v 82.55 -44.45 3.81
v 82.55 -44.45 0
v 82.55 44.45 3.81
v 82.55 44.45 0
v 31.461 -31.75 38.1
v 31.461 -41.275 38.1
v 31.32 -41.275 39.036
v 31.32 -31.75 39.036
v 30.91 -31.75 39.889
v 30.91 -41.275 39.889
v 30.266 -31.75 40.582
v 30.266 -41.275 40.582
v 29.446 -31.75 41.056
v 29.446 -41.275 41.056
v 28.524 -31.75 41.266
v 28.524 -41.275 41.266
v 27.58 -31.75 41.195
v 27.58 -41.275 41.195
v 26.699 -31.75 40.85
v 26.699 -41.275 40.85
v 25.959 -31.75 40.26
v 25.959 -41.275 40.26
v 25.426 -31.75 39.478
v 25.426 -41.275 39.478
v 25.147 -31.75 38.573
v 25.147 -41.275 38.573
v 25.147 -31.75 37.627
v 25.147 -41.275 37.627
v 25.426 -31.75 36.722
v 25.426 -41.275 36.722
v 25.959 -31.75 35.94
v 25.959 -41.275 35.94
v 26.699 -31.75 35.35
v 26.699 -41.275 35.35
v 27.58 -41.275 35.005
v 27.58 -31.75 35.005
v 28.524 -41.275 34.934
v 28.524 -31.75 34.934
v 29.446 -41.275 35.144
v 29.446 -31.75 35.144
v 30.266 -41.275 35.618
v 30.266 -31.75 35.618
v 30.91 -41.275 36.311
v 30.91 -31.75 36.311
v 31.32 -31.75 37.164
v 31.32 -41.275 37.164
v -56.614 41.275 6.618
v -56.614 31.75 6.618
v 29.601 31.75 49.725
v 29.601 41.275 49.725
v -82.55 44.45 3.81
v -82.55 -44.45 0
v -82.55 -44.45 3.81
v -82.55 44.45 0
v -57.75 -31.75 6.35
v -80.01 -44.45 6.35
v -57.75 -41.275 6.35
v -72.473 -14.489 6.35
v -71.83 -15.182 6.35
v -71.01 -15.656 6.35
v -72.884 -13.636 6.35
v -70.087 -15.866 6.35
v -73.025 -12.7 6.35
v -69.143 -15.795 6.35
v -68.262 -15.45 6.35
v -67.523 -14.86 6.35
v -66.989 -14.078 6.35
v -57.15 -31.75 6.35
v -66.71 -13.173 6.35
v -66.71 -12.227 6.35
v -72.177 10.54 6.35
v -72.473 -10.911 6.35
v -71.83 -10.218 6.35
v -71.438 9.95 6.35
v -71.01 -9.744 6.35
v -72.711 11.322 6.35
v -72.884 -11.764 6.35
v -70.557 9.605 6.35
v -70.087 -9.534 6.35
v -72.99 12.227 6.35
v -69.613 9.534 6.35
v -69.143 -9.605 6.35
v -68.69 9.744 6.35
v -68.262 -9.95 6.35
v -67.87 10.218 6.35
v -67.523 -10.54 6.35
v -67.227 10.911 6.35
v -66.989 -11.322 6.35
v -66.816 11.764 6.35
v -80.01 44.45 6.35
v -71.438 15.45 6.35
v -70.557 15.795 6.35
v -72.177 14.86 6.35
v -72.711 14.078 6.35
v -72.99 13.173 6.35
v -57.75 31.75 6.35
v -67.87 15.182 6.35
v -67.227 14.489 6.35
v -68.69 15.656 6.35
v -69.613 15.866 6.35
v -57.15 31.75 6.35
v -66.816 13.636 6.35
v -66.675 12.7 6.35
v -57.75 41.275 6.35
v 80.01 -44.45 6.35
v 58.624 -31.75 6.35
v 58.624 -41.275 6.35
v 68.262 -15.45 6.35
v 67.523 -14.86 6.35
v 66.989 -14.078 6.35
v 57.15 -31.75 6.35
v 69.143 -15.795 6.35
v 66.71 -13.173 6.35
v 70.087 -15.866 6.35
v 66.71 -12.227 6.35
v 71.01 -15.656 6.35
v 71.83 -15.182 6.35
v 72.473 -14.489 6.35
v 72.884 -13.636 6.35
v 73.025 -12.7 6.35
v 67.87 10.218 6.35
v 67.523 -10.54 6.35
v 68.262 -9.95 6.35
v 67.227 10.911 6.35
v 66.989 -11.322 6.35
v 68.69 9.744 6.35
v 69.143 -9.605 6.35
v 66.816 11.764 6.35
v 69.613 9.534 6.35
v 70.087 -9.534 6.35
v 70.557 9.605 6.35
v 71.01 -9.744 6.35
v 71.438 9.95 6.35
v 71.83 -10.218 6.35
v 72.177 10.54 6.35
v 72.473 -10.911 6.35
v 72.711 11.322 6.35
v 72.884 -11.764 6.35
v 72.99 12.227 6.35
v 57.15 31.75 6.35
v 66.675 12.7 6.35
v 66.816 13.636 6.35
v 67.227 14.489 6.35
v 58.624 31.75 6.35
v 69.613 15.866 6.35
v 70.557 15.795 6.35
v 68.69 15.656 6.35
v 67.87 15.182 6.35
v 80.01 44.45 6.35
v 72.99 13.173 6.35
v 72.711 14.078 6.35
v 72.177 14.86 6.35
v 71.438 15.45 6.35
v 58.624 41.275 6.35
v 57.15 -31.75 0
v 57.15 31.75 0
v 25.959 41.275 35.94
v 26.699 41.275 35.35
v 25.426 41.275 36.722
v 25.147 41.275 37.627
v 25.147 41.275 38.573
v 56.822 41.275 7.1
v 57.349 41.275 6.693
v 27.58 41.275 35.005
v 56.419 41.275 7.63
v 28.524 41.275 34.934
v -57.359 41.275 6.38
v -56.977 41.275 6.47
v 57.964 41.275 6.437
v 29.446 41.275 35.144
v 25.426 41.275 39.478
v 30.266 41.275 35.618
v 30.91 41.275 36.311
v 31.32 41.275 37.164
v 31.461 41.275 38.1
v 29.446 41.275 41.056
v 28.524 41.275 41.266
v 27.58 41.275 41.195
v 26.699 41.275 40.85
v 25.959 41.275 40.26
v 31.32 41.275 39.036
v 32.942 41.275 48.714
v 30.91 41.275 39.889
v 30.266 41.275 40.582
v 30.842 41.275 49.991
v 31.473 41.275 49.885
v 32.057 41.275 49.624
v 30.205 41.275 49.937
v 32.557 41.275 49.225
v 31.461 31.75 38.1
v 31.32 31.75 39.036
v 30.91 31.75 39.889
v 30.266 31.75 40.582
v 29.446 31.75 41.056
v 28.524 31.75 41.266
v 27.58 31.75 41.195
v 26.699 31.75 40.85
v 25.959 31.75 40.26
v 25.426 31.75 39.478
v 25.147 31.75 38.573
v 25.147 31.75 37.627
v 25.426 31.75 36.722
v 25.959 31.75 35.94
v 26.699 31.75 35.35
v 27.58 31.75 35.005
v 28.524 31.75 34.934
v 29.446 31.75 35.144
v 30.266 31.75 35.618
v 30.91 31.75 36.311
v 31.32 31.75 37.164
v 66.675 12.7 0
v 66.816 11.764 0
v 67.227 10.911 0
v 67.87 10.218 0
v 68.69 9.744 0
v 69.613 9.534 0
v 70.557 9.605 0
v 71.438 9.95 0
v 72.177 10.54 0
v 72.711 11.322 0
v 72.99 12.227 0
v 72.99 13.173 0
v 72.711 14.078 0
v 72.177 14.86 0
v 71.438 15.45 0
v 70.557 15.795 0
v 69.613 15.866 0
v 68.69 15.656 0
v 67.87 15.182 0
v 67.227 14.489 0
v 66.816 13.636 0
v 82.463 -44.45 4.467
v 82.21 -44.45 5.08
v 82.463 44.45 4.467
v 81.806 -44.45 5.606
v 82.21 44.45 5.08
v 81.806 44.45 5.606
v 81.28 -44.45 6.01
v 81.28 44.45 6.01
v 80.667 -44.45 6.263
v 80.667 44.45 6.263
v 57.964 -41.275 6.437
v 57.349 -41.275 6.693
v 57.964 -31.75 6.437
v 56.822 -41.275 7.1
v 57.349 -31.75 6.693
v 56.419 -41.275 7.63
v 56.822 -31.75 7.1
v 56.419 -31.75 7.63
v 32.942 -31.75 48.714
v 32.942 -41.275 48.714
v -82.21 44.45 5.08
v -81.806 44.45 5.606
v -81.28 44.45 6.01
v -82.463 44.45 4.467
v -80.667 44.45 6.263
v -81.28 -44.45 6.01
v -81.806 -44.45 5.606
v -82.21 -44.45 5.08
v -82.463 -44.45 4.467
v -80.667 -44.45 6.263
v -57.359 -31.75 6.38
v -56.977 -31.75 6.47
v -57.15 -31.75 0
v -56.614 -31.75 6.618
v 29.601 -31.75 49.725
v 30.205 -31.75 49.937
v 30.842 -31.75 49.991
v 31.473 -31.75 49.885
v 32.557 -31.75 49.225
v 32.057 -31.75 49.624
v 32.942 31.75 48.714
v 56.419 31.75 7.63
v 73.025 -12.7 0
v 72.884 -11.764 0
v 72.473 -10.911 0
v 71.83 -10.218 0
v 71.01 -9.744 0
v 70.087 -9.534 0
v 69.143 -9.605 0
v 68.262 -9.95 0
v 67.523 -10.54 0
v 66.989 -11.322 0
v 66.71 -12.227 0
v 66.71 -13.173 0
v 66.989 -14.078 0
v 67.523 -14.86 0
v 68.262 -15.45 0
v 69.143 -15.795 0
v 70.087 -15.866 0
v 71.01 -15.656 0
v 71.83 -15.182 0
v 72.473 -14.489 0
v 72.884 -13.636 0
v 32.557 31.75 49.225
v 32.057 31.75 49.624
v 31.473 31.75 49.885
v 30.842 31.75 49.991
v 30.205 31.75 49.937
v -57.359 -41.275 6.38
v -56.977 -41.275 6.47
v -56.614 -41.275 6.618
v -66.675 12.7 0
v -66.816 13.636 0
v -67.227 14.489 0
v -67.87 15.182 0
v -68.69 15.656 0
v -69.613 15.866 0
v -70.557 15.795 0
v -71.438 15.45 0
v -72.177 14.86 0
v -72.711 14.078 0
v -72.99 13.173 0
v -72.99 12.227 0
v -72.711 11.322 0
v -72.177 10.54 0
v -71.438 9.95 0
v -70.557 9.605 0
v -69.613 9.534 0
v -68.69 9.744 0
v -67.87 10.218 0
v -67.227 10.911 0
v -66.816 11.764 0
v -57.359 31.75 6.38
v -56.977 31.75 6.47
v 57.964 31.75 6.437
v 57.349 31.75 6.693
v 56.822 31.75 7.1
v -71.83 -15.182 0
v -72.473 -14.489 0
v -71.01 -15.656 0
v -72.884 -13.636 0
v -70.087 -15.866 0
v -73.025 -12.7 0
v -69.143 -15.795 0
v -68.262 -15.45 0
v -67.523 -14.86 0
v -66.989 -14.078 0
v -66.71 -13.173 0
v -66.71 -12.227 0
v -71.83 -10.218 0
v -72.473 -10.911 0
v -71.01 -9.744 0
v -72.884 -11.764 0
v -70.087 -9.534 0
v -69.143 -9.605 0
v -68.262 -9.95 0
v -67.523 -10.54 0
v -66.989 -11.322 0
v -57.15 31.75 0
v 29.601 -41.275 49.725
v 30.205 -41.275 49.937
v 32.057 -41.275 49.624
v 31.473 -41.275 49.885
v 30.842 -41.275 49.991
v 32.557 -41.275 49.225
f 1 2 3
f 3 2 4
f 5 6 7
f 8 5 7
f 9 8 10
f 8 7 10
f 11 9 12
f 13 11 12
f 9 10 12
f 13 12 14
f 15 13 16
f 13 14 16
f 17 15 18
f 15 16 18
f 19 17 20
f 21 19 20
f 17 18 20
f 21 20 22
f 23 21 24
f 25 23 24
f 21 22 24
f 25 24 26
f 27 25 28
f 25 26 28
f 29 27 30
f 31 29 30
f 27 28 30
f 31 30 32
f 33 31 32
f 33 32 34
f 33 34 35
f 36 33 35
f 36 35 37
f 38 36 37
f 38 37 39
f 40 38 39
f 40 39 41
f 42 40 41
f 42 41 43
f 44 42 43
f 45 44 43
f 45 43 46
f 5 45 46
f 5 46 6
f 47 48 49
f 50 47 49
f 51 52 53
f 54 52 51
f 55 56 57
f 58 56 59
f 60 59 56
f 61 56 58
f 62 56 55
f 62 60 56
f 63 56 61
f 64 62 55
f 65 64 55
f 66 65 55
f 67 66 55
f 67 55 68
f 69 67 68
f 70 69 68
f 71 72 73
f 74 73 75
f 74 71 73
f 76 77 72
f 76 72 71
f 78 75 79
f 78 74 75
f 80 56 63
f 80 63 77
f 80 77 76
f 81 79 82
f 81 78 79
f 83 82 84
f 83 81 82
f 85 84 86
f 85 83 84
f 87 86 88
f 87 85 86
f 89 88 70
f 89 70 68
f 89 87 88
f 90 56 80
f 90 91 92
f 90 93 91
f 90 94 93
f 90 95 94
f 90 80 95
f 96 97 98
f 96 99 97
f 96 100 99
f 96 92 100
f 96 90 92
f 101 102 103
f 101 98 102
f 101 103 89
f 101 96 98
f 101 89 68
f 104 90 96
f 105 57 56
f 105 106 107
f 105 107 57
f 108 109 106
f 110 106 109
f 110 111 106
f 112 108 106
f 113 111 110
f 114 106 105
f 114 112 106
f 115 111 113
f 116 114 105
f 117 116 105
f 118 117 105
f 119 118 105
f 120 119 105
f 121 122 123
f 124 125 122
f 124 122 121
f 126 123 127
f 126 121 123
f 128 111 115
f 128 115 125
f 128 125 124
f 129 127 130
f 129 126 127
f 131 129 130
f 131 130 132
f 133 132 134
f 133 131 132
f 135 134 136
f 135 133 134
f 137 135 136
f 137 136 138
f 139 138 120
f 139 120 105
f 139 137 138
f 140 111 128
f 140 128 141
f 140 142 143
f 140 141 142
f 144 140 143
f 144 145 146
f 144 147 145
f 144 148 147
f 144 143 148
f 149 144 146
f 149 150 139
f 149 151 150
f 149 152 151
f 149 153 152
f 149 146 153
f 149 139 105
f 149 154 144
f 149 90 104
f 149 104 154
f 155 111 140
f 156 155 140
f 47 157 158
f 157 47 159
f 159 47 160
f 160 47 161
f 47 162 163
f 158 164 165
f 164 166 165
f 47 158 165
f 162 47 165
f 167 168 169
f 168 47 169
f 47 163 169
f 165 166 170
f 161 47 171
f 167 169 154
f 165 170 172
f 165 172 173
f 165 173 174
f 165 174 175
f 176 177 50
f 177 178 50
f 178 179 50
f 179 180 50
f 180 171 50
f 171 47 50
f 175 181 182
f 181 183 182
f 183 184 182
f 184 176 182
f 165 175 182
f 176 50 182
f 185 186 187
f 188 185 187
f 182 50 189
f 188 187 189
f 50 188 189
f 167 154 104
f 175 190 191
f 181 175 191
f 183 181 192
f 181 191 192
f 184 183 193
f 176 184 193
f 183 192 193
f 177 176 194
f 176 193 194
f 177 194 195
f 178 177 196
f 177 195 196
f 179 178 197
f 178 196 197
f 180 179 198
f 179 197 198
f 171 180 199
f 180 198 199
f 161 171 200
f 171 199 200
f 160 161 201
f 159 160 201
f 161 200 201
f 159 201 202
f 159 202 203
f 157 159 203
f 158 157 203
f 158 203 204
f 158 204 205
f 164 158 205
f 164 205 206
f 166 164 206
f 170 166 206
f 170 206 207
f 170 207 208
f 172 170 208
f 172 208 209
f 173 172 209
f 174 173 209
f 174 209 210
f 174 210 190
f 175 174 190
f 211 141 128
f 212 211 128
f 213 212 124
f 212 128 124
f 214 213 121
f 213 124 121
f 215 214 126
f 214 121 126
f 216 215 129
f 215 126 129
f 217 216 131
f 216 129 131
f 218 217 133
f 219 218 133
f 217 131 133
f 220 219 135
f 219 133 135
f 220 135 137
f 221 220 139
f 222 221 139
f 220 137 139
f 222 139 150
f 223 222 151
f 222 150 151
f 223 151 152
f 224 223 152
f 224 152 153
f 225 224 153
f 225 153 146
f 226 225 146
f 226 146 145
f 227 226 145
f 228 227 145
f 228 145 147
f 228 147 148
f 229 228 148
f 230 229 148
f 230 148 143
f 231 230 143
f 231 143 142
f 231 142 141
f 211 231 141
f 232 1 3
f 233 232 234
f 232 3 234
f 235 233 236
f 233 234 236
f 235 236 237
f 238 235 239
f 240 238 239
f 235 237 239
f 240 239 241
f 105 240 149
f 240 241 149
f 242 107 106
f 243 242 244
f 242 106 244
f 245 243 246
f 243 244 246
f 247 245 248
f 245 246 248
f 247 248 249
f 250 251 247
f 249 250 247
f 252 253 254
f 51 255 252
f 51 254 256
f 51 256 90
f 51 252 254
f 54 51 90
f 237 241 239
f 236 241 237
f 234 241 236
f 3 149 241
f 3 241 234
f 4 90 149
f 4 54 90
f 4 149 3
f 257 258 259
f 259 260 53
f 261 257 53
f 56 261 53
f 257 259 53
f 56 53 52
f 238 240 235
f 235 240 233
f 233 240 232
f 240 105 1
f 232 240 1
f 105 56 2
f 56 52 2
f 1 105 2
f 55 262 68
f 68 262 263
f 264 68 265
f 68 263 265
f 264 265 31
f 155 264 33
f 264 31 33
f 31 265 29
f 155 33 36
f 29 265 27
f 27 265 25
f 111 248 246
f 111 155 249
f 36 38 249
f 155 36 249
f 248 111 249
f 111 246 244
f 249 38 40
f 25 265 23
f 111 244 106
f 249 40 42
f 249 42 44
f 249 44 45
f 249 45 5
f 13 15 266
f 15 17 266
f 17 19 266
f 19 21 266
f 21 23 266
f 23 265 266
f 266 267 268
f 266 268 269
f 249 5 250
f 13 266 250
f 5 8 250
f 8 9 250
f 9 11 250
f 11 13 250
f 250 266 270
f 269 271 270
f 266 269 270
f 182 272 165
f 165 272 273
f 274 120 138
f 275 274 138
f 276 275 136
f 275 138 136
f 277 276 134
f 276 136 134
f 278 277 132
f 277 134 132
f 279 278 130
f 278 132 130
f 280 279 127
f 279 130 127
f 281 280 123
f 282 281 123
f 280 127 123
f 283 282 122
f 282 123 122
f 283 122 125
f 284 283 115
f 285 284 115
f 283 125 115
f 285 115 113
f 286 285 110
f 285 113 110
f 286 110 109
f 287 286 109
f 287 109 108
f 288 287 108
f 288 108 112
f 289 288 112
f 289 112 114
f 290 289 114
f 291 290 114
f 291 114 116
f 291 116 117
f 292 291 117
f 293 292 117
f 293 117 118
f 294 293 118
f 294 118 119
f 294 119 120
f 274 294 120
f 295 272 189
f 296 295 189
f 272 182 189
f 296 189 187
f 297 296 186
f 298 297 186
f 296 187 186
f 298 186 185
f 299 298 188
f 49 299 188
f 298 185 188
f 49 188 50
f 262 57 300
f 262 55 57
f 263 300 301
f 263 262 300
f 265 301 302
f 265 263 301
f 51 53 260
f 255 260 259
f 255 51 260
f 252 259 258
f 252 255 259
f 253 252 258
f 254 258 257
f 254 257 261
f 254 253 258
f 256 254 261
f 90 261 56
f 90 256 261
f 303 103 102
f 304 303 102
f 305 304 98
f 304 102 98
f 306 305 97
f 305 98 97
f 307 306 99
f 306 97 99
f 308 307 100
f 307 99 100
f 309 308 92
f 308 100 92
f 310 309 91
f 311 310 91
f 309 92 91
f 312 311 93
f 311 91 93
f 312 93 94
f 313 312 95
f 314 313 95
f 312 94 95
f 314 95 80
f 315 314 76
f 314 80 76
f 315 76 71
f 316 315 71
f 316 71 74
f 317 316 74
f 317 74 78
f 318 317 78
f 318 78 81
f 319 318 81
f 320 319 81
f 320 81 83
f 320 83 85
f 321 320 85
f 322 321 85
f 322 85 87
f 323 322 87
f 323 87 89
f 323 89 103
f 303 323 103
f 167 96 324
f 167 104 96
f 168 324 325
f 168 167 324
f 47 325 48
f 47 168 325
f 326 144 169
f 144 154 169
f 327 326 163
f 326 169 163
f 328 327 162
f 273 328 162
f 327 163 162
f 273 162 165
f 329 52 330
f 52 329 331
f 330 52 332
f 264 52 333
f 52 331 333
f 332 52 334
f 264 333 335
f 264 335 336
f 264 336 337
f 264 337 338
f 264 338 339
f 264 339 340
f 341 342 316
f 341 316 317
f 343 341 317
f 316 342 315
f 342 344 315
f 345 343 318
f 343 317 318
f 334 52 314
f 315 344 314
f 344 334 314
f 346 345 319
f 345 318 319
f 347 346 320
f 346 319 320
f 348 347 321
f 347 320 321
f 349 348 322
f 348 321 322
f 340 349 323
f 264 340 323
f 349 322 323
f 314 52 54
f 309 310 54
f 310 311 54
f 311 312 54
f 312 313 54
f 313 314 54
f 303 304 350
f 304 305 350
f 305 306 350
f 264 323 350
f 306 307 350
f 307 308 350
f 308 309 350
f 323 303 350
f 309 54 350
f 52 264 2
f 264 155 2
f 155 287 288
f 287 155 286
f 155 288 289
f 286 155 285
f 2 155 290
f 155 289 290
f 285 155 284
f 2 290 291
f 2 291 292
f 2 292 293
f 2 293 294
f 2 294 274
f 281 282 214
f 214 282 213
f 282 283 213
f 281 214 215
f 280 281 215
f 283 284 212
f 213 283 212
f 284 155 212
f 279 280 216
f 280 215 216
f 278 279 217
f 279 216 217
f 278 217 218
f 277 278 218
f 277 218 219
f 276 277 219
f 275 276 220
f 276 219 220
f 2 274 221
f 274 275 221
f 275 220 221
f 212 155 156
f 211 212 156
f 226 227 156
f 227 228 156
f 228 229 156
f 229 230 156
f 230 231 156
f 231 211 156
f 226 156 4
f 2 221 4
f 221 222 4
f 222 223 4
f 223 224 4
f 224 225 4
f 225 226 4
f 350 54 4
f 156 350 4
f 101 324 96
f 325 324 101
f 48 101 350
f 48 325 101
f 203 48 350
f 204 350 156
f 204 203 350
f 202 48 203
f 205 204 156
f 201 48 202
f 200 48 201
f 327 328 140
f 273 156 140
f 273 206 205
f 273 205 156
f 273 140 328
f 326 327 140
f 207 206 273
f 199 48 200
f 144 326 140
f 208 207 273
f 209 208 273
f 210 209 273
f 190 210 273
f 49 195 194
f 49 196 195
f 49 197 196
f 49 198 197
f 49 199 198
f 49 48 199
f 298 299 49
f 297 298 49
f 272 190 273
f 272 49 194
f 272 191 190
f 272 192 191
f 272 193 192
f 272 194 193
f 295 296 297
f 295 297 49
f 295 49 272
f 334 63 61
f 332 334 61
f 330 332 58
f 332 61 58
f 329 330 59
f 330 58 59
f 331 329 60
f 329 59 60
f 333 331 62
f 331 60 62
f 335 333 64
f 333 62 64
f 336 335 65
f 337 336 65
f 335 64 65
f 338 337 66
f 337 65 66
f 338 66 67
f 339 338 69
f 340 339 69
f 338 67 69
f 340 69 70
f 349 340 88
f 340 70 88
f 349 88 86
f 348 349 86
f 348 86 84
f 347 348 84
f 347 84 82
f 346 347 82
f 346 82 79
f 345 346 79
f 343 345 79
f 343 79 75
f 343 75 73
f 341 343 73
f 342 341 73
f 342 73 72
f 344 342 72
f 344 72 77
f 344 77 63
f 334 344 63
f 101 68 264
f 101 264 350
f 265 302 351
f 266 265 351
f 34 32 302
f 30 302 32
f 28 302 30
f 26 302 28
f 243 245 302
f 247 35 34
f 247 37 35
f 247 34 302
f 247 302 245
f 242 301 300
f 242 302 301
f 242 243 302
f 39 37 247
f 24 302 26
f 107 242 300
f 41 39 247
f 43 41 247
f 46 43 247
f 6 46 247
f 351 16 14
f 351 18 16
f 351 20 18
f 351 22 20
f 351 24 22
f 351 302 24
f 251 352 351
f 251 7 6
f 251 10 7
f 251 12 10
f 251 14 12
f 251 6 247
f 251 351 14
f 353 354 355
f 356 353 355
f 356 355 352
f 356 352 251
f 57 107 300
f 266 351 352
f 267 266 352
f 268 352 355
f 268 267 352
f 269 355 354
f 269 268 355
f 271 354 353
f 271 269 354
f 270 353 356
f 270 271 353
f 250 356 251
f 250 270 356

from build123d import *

# Parameters (mm, degrees)
SKETCH1_W           = 165.1
SKETCH1_H           = 88.9
BOSS_EXTRUDE1_DEPTH = 50.8
SKETCH2_R           = 3.175
SKETCH2_W           = 114.3
SKETCH2_H           = 63.5
CUT_EXTRUDE1_DEPTH  = 107.634633211
SKETCH4_W           = 165.1
SKETCH4_H           = 88.9
SKETCH4_W_2         = 114.3
SKETCH4_H_2         = 82.55
CUT_EXTRUDE2_DEPTH  = 44.45
SKETCH5_R           = 3.175
CUT_EXTRUDE4_DEPTH  = 130.398292589
FILLET2_R           = 2.54


with BuildPart() as part:
    # Sketch1 → Boss-Extrude1 (new body)
    with BuildSketch(Plane.XY):
        Rectangle(SKETCH1_W, SKETCH1_H)
    extrude(amount=BOSS_EXTRUDE1_DEPTH)

    # Sketch2 → Cut-Extrude1 (cut, through all)
    with BuildSketch(Plane.XY.offset(50.8)):
        with Locations((-69.85, 12.7)):
            Circle(SKETCH2_R)
        with Locations(Location((-69.85, -12.7, 0), (0, 0, 180))):
            Circle(SKETCH2_R)
        with Locations((69.85, -12.7)):
            Circle(SKETCH2_R)
        with Locations(Location((69.85, 12.7, 0), (0, 0, 180))):
            Circle(SKETCH2_R)
        Rectangle(SKETCH2_W, SKETCH2_H)
    extrude(amount=-CUT_EXTRUDE1_DEPTH, mode=Mode.SUBTRACT)

    # Sketch4 → Cut-Extrude2 (cut)
    with BuildSketch(Plane.XY.offset(50.8)):
        Rectangle(SKETCH4_W, SKETCH4_H)
        Rectangle(SKETCH4_W_2, SKETCH4_H_2, mode=Mode.SUBTRACT)
    extrude(amount=-CUT_EXTRUDE2_DEPTH, mode=Mode.SUBTRACT)

    # Sketch5 → Cut-Extrude4 (cut, through all)
    with BuildSketch(Plane.XZ.offset(41.275)):
        Polygon((-57.15, 6.35), (31.75, 50.8), (-57.15, 50.8), align=None)
        Polygon((31.75, 50.8), (57.15, 6.35), (57.15, 50.8), align=None)
        with Locations((28.286363636, 38.1)):
            Circle(SKETCH5_R)
    extrude(amount=-CUT_EXTRUDE4_DEPTH, mode=Mode.SUBTRACT)

    # Fillet2
    fillet2_edges = [part.edges().sort_by_distance(p)[0] for p in [
        (-57.15, 36.5125, 6.35),
        (-57.15, -36.5125, 6.35),
        (57.15, -36.5125, 6.35),
        (57.15, 36.5125, 6.35),
        (-82.55, 0, 6.35),
        (82.55, 0, 6.35),
        (31.75, -36.5125, 50.8),
        (31.75, 36.5125, 50.8),
    ]]
    fillet(fillet2_edges, radius=FILLET2_R)


solid = part.part
